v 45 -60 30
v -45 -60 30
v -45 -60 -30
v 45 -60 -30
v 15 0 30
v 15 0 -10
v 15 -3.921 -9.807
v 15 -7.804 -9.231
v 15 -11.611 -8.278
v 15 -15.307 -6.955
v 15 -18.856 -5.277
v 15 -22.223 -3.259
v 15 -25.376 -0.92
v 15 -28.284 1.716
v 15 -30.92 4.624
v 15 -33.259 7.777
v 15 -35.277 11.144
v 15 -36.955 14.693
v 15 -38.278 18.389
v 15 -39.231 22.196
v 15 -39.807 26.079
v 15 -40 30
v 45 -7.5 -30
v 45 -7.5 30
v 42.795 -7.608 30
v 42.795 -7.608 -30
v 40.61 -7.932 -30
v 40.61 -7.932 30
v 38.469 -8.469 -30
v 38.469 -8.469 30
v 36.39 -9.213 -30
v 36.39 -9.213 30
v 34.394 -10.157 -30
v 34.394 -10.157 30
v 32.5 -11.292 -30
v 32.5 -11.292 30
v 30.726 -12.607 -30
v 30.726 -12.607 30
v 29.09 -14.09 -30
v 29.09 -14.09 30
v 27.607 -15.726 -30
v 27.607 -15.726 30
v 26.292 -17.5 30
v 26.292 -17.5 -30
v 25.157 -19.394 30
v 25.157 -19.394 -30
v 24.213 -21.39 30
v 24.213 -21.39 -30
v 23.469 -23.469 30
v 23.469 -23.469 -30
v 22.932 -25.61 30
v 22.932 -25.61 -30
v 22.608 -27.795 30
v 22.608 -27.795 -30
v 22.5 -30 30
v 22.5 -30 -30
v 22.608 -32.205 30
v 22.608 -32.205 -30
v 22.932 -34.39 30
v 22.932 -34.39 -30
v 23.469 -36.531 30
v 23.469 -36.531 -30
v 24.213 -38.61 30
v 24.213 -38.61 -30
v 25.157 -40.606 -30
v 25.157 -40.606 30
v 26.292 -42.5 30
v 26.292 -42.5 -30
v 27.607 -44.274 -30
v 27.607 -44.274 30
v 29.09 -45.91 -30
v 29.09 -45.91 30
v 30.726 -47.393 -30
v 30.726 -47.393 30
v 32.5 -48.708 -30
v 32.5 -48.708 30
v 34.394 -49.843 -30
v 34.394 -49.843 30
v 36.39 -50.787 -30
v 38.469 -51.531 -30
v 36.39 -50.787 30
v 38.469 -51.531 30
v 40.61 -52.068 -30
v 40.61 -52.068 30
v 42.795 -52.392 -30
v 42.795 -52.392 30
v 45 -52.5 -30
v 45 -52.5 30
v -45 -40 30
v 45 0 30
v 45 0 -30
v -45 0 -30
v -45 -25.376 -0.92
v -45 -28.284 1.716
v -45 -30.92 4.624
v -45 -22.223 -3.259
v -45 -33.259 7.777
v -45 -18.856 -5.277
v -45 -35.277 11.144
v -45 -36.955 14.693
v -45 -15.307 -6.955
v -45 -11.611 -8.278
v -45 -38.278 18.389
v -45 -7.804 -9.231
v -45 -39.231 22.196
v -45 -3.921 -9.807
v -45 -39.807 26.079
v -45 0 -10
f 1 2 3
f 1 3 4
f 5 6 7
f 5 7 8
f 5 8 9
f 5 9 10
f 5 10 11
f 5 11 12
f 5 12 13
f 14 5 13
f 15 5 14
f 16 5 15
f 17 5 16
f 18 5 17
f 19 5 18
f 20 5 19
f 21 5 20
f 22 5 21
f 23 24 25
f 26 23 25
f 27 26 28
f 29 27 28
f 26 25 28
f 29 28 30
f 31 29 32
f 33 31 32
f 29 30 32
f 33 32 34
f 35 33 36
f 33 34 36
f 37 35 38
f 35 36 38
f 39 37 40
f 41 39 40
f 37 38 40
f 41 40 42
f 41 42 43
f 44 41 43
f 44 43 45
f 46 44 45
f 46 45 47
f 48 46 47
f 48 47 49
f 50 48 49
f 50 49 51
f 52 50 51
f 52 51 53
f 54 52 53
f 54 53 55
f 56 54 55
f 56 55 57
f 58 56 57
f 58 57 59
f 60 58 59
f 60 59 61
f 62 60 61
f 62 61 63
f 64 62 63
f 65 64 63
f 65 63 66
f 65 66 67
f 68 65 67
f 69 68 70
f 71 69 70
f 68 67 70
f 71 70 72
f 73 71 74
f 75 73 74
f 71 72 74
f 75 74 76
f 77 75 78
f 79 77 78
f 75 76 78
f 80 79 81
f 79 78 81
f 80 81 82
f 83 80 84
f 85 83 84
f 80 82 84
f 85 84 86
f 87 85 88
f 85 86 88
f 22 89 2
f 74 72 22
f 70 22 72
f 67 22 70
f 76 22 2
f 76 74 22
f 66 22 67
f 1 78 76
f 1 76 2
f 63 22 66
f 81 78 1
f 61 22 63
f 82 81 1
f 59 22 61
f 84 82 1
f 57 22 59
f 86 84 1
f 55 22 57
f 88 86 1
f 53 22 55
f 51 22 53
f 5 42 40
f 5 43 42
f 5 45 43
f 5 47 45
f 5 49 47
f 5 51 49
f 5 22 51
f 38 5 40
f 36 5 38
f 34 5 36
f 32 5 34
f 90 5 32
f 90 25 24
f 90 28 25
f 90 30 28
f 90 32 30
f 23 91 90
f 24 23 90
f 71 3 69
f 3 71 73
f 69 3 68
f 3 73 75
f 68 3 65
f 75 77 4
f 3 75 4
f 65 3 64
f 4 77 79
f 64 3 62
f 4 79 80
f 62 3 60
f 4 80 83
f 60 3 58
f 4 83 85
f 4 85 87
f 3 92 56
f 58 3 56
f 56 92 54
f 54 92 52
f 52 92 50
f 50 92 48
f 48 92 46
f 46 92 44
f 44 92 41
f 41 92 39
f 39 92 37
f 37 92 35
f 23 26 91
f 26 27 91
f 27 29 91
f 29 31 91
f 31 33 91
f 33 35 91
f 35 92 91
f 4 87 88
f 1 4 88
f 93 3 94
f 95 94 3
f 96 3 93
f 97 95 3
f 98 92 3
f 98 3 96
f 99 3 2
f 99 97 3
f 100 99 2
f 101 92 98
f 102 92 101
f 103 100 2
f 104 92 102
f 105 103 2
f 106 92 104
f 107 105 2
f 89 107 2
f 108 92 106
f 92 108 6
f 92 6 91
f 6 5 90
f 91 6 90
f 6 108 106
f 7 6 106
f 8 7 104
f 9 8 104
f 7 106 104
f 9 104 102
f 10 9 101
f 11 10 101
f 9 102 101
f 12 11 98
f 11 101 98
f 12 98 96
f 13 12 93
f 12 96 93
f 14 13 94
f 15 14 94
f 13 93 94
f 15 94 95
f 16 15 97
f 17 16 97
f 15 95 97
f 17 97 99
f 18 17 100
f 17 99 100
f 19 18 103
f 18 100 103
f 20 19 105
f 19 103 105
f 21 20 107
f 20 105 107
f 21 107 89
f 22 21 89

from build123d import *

# Parameters (mm, degrees)
F0_W     = 90
F0_H     = 60
F1_DEPTH = 60
F3_DEPTH = 60.001
F5_DEPTH = 60


with BuildPart() as f1:
    # F0 (on Front) → F1 (new body)
    with BuildSketch(Plane.XZ):
        Rectangle(F0_W, F0_H)
    extrude(amount=F1_DEPTH)

    # F2 (on face) → F3 (cut, through all)
    with BuildSketch(Plane.XY.offset(30)):
        with BuildLine():
            Line((45, -52.5), (45, -7.5))
            ThreePointArc((45, -7.5), (22.5, -30), (45, -52.5))
        make_face()
    extrude(amount=-F3_DEPTH, mode=Mode.SUBTRACT)

    # F4 (on face) → F5 (cut)
    with BuildSketch(Plane(origin=(-45, 0, 0), x_dir=(0, -1, 0), z_dir=(-1, 0, 0))):
        with BuildLine():
            Line((0, 30), (0, -10))
            ThreePointArc((0, -10), (28.284271, 1.715729), (40, 30))
            Line((40, 30), (0, 30))
        make_face()
    extrude(amount=-F5_DEPTH, mode=Mode.SUBTRACT)


solid = f1.part
